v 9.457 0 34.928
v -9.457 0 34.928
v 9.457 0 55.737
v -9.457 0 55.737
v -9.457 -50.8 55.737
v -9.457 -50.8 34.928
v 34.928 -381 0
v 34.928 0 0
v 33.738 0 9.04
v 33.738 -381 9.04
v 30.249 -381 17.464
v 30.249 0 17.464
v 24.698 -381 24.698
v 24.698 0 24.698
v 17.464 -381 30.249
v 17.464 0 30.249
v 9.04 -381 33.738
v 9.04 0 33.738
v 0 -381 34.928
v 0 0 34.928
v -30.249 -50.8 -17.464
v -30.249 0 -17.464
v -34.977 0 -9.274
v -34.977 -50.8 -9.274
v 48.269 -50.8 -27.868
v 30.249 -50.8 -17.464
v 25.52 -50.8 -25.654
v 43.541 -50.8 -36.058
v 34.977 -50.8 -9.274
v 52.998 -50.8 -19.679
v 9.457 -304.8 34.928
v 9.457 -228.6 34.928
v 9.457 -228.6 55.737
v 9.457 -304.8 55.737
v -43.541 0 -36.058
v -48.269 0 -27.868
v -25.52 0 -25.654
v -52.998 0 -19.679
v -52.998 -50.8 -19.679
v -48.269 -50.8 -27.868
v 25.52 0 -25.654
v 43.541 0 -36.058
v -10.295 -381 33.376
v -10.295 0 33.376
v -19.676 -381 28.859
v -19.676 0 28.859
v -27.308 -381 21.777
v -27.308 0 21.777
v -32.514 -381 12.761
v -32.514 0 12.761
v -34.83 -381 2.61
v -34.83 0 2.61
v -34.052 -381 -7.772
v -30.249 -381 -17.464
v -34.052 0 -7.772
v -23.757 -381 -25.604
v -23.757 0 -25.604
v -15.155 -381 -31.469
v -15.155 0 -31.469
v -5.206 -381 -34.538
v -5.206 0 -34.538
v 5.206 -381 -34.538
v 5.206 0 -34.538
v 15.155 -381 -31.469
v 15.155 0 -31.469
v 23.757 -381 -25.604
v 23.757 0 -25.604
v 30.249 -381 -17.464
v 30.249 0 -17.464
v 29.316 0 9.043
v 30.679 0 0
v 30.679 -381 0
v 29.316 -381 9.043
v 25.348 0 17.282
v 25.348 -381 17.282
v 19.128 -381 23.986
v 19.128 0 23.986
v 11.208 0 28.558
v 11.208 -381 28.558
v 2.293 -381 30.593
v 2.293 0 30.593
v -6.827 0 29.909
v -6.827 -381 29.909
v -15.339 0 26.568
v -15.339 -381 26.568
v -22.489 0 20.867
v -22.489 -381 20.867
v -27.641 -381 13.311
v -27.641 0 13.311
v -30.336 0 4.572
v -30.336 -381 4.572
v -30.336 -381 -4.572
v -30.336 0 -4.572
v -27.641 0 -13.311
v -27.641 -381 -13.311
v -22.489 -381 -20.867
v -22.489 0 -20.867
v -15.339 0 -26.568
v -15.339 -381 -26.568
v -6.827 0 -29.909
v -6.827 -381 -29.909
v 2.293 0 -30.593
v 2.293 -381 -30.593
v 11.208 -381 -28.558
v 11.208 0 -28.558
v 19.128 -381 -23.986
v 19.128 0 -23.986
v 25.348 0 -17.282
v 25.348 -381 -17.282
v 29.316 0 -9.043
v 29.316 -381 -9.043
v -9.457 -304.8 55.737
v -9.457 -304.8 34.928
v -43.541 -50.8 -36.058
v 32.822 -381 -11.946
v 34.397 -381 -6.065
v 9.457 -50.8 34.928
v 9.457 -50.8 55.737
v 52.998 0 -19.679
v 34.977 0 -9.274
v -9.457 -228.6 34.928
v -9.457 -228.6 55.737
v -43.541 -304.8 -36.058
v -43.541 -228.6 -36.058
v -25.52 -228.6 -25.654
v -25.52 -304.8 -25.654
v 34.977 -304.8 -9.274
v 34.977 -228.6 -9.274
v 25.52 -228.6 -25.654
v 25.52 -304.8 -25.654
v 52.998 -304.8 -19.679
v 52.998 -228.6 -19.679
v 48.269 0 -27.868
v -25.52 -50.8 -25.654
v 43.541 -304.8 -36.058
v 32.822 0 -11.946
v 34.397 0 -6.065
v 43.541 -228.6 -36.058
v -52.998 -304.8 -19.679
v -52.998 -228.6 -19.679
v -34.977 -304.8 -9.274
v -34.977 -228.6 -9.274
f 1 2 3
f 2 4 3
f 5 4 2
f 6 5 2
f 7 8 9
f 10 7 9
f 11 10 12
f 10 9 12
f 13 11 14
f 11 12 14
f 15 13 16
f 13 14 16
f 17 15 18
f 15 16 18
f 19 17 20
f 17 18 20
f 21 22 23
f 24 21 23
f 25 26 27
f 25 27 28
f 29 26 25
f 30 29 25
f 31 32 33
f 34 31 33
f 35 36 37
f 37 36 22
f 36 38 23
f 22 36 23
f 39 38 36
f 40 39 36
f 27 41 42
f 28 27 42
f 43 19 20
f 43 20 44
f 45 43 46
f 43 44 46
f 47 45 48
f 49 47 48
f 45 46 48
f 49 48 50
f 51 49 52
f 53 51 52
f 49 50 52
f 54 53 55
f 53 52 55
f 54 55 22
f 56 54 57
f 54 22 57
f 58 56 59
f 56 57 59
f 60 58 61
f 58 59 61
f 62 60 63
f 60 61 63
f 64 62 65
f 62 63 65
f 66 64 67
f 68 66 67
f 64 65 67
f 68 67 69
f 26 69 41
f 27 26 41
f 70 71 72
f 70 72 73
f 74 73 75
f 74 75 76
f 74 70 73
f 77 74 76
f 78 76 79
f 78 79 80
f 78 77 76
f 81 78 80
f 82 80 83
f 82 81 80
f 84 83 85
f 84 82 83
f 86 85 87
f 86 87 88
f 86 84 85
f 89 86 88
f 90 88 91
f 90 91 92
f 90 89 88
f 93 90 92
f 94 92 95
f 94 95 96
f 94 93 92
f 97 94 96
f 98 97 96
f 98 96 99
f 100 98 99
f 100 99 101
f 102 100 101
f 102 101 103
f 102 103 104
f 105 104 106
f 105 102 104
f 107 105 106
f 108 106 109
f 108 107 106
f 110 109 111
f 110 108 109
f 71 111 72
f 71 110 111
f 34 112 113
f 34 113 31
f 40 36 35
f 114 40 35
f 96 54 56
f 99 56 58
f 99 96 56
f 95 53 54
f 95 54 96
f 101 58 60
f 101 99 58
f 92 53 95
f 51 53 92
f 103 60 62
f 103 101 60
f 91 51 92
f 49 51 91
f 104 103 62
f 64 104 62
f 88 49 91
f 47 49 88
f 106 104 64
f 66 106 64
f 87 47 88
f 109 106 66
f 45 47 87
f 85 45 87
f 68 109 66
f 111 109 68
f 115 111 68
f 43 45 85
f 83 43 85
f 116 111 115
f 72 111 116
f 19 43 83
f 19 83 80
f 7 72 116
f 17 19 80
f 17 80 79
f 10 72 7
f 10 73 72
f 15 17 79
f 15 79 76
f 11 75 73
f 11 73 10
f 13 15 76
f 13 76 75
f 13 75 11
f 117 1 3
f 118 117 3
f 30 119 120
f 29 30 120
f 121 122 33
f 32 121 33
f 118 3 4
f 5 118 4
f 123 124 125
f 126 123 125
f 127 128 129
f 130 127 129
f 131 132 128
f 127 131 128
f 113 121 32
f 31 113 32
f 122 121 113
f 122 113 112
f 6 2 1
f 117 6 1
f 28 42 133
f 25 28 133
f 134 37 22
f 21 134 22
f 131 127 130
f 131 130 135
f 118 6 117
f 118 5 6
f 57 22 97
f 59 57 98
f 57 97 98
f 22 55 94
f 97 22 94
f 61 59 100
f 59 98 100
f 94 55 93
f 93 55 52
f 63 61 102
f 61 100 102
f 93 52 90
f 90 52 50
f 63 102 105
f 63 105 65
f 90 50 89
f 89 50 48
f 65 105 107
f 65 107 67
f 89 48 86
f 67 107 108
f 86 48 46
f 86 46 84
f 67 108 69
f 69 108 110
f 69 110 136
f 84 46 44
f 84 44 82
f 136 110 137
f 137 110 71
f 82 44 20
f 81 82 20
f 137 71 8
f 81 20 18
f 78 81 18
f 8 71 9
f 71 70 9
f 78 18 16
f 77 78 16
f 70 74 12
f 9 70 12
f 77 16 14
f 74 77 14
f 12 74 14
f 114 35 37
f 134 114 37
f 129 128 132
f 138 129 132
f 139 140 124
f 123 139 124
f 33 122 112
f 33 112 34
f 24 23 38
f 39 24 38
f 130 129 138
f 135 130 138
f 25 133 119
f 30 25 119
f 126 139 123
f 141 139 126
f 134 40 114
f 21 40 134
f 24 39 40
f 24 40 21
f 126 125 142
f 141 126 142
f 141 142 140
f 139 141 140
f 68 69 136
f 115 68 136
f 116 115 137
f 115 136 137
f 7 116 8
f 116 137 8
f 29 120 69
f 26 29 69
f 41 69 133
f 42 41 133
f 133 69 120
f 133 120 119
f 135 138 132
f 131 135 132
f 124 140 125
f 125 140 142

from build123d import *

# Parameters (mm, degrees)
F0_R      = 30.678650709
F1_DEPTH  = 381
F2_DEPTH  = 50.8
F3_START  = 177.8
F2_FACE_W = 18.9131628722
F2_FACE_H = 20.8084275999
F3_DEPTH  = 76.2


with BuildPart() as f1:
    # F0 (on Front) → F1 (new body)
    with BuildSketch(Plane.XZ):
        with BuildLine():
            ThreePointArc((30.2486148014, -17.4640458982), (33.7379459292, -9.040055366), (34.9280917964, 0))
            ThreePointArc((34.9280917964, 0), (24.6978905631, 24.6978905631), (0, 34.9280917964))
            ThreePointArc((0, 34.9280917964), (-30.2486148014, 17.4640458982), (-30.2486148014, -17.4640458982))
            ThreePointArc((-30.2486148014, -17.4640458982), (0, -34.9280917964), (30.2486148014, -17.4640458982))
        make_face()
        Circle(F0_R, mode=Mode.SUBTRACT)
    extrude(amount=F1_DEPTH)


with BuildPart() as f2:
    # F0 (on Front) → F2 (new body)
    with BuildSketch(Plane.XZ):
        Polygon((-9.4565814361, 34.9280917964), (0, 34.9280917964), (9.4565814361, 34.9280917964), (9.4565814361, 55.7365193963), (0, 55.7365193963), (-9.4565814361, 55.7365193963), align=None)
    extrude(amount=F2_DEPTH)


with BuildPart() as f2b:
    # F0 (on Front) → F2, piece 2 (new body)
    with BuildSketch(Plane.XZ):
        Polygon((34.9769055195, -9.2744061416), (30.2486148014, -17.4640458982), (25.5203240834, -25.6536856548), (43.5409509977, -36.0578994548), (48.2692417157, -27.8682596982), (52.9975324338, -19.6786199415), align=None)
    extrude(amount=F2_DEPTH)


with BuildPart() as f2c:
    # F0 (on Front) → F2, piece 3 (new body)
    with BuildSketch(Plane.XZ):
        Polygon((-25.5203240834, -25.6536856548), (-30.2486148014, -17.4640458982), (-34.9769055195, -9.2744061416), (-52.9975324338, -19.6786199415), (-48.2692417157, -27.8682596982), (-43.5409509977, -36.0578994548), align=None)
    extrude(amount=F2_DEPTH)


with BuildPart() as f3:
    # F2_face (on face) → F3 (new body)
    with BuildSketch(Plane(origin=(0, -50.8, 45.3323055964), x_dir=(1, 0, 0), z_dir=(0, -1, 0)).offset(F3_START)):
        Rectangle(F2_FACE_W, F2_FACE_H)
    extrude(amount=F3_DEPTH)


with BuildPart() as f3b:
    # F2_face (on face) → F3, piece 2 (new body)
    with BuildSketch(Plane(origin=(0, -50.8, 45.3323055964), x_dir=(1, 0, 0), z_dir=(0, -1, 0)).offset(F3_START)):
        Polygon((-43.5409509977, -81.3902050511), (-25.5203240834, -70.9859912512), (-34.9769055195, -54.6067117379), (-52.9975324338, -65.0109255379), align=None)
    extrude(amount=F3_DEPTH)


with BuildPart() as f3c:
    # F2_face (on face) → F3, piece 3 (new body)
    with BuildSketch(Plane(origin=(0, -50.8, 45.3323055964), x_dir=(1, 0, 0), z_dir=(0, -1, 0)).offset(F3_START)):
        Polygon((52.9975324338, -65.0109255379), (34.9769055195, -54.6067117379), (25.5203240834, -70.9859912512), (43.5409509977, -81.3902050511), align=None)
    extrude(amount=F3_DEPTH)


solid = Compound([f1.part, f2.part, f2b.part, f2c.part, f3.part, f3b.part, f3c.part])
